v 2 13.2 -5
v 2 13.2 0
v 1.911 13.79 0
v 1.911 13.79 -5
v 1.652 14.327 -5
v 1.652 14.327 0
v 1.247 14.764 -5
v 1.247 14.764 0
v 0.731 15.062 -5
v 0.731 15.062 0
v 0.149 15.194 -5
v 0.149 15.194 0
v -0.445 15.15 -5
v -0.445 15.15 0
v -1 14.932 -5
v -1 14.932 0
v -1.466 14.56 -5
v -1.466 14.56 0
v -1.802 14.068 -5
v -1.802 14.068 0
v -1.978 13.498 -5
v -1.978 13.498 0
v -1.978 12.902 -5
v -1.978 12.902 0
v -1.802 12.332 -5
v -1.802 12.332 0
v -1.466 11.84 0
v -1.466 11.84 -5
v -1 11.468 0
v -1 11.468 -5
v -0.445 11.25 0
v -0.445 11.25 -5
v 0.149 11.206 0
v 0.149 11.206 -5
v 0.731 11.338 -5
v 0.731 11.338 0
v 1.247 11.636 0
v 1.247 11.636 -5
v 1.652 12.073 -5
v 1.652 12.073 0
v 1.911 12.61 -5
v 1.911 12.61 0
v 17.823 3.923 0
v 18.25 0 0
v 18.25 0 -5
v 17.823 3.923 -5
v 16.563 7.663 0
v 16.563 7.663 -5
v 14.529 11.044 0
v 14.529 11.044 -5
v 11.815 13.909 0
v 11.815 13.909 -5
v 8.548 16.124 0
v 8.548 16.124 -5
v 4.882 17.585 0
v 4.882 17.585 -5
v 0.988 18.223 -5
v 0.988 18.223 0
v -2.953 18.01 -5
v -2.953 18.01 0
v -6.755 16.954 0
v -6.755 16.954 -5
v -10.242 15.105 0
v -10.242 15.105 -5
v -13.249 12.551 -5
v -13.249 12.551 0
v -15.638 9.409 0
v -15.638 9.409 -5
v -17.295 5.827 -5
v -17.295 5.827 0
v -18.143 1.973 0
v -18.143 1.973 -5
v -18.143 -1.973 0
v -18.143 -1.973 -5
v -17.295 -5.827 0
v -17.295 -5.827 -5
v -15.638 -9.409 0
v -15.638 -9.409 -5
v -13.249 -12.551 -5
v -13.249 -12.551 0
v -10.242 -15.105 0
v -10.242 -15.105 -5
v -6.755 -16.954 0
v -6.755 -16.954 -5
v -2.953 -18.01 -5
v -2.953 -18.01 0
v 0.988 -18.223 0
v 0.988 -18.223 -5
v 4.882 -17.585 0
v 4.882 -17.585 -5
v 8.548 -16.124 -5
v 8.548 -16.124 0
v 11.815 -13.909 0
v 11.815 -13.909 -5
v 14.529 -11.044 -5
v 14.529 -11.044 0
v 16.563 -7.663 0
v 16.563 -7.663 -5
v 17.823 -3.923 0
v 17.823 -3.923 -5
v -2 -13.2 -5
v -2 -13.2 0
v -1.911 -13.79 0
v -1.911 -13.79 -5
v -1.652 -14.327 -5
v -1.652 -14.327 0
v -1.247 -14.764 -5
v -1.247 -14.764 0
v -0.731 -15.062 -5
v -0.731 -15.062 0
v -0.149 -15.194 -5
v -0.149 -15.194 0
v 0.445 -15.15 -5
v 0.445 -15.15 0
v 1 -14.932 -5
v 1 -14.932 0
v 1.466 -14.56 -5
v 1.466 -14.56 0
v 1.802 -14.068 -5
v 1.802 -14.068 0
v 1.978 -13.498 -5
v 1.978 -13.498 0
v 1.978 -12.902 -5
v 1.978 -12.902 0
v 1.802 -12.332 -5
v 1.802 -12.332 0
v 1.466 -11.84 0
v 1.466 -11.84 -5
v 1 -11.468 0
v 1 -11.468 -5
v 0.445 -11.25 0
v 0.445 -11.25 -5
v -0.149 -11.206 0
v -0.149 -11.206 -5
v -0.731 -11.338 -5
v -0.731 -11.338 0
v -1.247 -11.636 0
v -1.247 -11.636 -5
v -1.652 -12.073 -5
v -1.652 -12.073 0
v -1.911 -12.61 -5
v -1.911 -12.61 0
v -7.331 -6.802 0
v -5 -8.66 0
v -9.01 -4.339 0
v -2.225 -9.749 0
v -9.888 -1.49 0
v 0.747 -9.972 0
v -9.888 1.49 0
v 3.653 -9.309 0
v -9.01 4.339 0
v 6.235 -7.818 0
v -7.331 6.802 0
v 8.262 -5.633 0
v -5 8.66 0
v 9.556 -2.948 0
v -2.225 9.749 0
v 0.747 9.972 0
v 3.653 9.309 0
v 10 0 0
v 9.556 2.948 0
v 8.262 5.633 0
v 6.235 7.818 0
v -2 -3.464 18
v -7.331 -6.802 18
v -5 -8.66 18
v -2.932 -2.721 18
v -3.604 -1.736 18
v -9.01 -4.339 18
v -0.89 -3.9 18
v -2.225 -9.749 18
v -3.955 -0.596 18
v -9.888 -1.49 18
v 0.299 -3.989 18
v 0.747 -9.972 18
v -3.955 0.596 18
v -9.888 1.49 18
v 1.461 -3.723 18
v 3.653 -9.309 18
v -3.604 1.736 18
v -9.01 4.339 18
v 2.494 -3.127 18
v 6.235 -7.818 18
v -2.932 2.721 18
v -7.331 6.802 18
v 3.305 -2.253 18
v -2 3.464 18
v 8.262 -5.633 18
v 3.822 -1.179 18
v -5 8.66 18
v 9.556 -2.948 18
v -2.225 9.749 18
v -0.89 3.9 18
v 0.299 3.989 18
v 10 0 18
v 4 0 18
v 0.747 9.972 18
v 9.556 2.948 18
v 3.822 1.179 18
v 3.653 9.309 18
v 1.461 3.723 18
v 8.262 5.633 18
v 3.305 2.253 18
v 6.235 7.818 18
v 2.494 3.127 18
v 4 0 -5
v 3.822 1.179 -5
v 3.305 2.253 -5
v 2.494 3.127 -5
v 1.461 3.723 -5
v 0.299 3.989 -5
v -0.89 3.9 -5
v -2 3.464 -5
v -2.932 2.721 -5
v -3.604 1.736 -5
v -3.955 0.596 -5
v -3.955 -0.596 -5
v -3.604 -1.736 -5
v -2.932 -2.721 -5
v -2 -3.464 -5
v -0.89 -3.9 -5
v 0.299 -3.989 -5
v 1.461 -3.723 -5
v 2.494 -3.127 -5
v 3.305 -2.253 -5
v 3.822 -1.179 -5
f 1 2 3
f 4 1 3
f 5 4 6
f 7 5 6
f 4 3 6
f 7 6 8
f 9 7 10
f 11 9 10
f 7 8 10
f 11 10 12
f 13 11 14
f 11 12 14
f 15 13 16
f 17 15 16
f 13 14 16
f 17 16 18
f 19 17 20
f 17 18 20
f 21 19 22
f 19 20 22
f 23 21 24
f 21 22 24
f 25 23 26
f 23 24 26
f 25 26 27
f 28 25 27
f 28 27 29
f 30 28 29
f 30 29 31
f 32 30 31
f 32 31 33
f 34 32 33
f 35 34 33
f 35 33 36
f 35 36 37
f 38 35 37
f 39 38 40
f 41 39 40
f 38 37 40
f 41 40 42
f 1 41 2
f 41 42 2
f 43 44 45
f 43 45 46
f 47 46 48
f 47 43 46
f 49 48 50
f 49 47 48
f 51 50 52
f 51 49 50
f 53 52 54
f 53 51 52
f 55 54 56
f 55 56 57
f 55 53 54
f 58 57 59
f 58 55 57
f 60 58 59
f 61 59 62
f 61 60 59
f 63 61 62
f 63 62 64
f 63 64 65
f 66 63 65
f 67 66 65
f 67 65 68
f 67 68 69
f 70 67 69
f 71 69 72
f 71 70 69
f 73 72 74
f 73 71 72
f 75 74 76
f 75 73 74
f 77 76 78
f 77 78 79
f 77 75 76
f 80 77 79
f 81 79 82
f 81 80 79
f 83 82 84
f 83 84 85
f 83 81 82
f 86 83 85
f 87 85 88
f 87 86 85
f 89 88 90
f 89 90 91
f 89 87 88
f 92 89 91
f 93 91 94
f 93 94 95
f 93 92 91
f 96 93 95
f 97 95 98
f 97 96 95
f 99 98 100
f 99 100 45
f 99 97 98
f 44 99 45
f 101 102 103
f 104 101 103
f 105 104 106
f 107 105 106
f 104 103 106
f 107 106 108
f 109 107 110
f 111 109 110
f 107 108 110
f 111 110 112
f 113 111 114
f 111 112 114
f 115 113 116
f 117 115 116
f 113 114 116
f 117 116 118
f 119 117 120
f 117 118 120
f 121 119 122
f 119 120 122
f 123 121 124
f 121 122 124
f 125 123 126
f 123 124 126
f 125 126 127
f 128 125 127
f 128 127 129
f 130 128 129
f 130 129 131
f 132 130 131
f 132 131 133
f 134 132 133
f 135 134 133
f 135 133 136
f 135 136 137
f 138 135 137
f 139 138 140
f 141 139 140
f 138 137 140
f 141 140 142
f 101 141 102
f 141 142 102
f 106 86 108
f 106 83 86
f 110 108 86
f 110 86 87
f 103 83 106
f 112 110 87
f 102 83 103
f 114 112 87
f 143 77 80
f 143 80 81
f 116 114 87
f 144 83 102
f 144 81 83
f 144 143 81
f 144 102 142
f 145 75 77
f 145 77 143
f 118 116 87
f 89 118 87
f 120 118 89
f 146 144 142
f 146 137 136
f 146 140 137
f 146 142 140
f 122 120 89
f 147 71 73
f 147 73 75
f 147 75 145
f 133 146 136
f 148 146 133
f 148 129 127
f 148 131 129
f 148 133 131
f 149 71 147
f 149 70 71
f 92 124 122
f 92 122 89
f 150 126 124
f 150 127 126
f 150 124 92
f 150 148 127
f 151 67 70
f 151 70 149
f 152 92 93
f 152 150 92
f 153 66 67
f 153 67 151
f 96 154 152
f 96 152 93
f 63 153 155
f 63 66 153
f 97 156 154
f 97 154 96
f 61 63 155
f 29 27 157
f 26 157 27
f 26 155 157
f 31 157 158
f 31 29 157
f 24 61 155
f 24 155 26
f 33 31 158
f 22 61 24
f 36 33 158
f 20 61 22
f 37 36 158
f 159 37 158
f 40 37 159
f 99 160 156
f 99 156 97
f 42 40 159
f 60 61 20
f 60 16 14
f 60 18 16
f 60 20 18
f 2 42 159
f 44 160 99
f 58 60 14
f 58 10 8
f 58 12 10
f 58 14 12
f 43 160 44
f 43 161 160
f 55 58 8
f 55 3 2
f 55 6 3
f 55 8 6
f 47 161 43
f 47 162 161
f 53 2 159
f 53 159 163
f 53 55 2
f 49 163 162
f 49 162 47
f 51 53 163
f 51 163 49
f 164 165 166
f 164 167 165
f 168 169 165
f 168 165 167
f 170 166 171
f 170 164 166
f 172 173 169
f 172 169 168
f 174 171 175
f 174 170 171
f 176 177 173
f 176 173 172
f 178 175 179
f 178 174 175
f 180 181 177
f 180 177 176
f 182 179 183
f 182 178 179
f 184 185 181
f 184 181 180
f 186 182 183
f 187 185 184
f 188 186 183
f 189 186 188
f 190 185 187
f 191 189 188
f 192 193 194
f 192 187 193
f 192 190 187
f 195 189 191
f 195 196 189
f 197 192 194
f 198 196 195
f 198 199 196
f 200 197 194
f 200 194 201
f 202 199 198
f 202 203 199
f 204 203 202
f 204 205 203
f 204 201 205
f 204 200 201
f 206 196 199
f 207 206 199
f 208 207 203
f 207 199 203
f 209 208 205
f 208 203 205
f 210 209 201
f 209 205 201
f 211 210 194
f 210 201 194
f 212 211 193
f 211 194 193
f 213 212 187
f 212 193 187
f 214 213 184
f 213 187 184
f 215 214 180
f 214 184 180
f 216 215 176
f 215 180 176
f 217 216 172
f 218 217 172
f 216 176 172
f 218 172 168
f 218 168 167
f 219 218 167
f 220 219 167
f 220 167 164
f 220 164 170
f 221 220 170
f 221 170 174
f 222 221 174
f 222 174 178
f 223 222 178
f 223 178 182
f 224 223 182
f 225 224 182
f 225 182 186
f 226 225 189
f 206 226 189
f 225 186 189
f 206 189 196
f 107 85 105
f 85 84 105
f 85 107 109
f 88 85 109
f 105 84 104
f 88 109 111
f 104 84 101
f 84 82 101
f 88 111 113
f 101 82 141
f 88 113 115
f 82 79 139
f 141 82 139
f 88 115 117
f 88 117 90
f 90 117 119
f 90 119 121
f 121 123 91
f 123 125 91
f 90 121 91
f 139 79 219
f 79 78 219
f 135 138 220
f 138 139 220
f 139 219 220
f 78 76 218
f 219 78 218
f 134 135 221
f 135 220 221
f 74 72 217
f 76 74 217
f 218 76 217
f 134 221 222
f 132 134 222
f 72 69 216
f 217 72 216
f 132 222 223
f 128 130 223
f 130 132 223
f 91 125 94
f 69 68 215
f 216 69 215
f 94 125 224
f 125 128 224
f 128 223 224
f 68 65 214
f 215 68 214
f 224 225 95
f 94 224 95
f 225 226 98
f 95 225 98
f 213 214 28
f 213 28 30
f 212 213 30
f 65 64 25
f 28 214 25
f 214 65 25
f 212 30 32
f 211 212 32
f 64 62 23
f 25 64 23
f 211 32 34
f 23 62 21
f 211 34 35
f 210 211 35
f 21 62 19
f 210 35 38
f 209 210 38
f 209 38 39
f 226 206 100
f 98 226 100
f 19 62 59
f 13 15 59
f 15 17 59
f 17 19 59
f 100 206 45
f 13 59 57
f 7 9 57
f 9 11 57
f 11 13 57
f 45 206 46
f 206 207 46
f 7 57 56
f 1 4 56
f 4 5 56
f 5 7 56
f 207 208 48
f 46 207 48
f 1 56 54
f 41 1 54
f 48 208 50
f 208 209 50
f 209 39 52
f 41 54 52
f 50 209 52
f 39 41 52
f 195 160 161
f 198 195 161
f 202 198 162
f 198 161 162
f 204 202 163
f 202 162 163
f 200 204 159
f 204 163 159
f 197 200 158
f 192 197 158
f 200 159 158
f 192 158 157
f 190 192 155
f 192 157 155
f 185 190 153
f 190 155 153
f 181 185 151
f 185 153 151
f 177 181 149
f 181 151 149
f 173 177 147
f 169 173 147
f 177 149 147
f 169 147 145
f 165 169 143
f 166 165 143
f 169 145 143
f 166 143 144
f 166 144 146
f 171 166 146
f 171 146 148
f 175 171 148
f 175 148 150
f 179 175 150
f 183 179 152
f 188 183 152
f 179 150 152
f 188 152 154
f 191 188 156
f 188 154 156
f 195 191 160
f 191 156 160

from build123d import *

# Parameters (mm, degrees)
CROQUIS1_R              = 18.25
CROQUIS1_R_2            = 2
SALIENTE_EXTRUIR2_DEPTH = 5
CROQUIS2_R              = 10
SALIENTE_EXTRUIR4_DEPTH = 18
CROQUIS3_R              = 4
CORTAR_EXTRUIR1_DEPTH   = 23


with BuildPart() as part:
    # Croquis1 → Saliente-Extruir2 (new body)
    with BuildSketch(Plane.XY):
        Circle(CROQUIS1_R)
        with Locations((0, 13.2)):
            Circle(CROQUIS1_R_2, mode=Mode.SUBTRACT)
        with Locations(Location((0, -13.2, 0), (0, 0, 180))):
            Circle(CROQUIS1_R_2, mode=Mode.SUBTRACT)
    extrude(amount=-SALIENTE_EXTRUIR2_DEPTH)

    # Croquis2 → Saliente-Extruir4 (add)
    with BuildSketch(Plane.XY):
        Circle(CROQUIS2_R)
    extrude(amount=SALIENTE_EXTRUIR4_DEPTH)

    # Croquis3 → Cortar-Extruir1 (cut)
    with BuildSketch(Plane.XY.offset(18)):
        Circle(CROQUIS3_R)
    extrude(amount=-CORTAR_EXTRUIR1_DEPTH, mode=Mode.SUBTRACT)


solid = part.part
